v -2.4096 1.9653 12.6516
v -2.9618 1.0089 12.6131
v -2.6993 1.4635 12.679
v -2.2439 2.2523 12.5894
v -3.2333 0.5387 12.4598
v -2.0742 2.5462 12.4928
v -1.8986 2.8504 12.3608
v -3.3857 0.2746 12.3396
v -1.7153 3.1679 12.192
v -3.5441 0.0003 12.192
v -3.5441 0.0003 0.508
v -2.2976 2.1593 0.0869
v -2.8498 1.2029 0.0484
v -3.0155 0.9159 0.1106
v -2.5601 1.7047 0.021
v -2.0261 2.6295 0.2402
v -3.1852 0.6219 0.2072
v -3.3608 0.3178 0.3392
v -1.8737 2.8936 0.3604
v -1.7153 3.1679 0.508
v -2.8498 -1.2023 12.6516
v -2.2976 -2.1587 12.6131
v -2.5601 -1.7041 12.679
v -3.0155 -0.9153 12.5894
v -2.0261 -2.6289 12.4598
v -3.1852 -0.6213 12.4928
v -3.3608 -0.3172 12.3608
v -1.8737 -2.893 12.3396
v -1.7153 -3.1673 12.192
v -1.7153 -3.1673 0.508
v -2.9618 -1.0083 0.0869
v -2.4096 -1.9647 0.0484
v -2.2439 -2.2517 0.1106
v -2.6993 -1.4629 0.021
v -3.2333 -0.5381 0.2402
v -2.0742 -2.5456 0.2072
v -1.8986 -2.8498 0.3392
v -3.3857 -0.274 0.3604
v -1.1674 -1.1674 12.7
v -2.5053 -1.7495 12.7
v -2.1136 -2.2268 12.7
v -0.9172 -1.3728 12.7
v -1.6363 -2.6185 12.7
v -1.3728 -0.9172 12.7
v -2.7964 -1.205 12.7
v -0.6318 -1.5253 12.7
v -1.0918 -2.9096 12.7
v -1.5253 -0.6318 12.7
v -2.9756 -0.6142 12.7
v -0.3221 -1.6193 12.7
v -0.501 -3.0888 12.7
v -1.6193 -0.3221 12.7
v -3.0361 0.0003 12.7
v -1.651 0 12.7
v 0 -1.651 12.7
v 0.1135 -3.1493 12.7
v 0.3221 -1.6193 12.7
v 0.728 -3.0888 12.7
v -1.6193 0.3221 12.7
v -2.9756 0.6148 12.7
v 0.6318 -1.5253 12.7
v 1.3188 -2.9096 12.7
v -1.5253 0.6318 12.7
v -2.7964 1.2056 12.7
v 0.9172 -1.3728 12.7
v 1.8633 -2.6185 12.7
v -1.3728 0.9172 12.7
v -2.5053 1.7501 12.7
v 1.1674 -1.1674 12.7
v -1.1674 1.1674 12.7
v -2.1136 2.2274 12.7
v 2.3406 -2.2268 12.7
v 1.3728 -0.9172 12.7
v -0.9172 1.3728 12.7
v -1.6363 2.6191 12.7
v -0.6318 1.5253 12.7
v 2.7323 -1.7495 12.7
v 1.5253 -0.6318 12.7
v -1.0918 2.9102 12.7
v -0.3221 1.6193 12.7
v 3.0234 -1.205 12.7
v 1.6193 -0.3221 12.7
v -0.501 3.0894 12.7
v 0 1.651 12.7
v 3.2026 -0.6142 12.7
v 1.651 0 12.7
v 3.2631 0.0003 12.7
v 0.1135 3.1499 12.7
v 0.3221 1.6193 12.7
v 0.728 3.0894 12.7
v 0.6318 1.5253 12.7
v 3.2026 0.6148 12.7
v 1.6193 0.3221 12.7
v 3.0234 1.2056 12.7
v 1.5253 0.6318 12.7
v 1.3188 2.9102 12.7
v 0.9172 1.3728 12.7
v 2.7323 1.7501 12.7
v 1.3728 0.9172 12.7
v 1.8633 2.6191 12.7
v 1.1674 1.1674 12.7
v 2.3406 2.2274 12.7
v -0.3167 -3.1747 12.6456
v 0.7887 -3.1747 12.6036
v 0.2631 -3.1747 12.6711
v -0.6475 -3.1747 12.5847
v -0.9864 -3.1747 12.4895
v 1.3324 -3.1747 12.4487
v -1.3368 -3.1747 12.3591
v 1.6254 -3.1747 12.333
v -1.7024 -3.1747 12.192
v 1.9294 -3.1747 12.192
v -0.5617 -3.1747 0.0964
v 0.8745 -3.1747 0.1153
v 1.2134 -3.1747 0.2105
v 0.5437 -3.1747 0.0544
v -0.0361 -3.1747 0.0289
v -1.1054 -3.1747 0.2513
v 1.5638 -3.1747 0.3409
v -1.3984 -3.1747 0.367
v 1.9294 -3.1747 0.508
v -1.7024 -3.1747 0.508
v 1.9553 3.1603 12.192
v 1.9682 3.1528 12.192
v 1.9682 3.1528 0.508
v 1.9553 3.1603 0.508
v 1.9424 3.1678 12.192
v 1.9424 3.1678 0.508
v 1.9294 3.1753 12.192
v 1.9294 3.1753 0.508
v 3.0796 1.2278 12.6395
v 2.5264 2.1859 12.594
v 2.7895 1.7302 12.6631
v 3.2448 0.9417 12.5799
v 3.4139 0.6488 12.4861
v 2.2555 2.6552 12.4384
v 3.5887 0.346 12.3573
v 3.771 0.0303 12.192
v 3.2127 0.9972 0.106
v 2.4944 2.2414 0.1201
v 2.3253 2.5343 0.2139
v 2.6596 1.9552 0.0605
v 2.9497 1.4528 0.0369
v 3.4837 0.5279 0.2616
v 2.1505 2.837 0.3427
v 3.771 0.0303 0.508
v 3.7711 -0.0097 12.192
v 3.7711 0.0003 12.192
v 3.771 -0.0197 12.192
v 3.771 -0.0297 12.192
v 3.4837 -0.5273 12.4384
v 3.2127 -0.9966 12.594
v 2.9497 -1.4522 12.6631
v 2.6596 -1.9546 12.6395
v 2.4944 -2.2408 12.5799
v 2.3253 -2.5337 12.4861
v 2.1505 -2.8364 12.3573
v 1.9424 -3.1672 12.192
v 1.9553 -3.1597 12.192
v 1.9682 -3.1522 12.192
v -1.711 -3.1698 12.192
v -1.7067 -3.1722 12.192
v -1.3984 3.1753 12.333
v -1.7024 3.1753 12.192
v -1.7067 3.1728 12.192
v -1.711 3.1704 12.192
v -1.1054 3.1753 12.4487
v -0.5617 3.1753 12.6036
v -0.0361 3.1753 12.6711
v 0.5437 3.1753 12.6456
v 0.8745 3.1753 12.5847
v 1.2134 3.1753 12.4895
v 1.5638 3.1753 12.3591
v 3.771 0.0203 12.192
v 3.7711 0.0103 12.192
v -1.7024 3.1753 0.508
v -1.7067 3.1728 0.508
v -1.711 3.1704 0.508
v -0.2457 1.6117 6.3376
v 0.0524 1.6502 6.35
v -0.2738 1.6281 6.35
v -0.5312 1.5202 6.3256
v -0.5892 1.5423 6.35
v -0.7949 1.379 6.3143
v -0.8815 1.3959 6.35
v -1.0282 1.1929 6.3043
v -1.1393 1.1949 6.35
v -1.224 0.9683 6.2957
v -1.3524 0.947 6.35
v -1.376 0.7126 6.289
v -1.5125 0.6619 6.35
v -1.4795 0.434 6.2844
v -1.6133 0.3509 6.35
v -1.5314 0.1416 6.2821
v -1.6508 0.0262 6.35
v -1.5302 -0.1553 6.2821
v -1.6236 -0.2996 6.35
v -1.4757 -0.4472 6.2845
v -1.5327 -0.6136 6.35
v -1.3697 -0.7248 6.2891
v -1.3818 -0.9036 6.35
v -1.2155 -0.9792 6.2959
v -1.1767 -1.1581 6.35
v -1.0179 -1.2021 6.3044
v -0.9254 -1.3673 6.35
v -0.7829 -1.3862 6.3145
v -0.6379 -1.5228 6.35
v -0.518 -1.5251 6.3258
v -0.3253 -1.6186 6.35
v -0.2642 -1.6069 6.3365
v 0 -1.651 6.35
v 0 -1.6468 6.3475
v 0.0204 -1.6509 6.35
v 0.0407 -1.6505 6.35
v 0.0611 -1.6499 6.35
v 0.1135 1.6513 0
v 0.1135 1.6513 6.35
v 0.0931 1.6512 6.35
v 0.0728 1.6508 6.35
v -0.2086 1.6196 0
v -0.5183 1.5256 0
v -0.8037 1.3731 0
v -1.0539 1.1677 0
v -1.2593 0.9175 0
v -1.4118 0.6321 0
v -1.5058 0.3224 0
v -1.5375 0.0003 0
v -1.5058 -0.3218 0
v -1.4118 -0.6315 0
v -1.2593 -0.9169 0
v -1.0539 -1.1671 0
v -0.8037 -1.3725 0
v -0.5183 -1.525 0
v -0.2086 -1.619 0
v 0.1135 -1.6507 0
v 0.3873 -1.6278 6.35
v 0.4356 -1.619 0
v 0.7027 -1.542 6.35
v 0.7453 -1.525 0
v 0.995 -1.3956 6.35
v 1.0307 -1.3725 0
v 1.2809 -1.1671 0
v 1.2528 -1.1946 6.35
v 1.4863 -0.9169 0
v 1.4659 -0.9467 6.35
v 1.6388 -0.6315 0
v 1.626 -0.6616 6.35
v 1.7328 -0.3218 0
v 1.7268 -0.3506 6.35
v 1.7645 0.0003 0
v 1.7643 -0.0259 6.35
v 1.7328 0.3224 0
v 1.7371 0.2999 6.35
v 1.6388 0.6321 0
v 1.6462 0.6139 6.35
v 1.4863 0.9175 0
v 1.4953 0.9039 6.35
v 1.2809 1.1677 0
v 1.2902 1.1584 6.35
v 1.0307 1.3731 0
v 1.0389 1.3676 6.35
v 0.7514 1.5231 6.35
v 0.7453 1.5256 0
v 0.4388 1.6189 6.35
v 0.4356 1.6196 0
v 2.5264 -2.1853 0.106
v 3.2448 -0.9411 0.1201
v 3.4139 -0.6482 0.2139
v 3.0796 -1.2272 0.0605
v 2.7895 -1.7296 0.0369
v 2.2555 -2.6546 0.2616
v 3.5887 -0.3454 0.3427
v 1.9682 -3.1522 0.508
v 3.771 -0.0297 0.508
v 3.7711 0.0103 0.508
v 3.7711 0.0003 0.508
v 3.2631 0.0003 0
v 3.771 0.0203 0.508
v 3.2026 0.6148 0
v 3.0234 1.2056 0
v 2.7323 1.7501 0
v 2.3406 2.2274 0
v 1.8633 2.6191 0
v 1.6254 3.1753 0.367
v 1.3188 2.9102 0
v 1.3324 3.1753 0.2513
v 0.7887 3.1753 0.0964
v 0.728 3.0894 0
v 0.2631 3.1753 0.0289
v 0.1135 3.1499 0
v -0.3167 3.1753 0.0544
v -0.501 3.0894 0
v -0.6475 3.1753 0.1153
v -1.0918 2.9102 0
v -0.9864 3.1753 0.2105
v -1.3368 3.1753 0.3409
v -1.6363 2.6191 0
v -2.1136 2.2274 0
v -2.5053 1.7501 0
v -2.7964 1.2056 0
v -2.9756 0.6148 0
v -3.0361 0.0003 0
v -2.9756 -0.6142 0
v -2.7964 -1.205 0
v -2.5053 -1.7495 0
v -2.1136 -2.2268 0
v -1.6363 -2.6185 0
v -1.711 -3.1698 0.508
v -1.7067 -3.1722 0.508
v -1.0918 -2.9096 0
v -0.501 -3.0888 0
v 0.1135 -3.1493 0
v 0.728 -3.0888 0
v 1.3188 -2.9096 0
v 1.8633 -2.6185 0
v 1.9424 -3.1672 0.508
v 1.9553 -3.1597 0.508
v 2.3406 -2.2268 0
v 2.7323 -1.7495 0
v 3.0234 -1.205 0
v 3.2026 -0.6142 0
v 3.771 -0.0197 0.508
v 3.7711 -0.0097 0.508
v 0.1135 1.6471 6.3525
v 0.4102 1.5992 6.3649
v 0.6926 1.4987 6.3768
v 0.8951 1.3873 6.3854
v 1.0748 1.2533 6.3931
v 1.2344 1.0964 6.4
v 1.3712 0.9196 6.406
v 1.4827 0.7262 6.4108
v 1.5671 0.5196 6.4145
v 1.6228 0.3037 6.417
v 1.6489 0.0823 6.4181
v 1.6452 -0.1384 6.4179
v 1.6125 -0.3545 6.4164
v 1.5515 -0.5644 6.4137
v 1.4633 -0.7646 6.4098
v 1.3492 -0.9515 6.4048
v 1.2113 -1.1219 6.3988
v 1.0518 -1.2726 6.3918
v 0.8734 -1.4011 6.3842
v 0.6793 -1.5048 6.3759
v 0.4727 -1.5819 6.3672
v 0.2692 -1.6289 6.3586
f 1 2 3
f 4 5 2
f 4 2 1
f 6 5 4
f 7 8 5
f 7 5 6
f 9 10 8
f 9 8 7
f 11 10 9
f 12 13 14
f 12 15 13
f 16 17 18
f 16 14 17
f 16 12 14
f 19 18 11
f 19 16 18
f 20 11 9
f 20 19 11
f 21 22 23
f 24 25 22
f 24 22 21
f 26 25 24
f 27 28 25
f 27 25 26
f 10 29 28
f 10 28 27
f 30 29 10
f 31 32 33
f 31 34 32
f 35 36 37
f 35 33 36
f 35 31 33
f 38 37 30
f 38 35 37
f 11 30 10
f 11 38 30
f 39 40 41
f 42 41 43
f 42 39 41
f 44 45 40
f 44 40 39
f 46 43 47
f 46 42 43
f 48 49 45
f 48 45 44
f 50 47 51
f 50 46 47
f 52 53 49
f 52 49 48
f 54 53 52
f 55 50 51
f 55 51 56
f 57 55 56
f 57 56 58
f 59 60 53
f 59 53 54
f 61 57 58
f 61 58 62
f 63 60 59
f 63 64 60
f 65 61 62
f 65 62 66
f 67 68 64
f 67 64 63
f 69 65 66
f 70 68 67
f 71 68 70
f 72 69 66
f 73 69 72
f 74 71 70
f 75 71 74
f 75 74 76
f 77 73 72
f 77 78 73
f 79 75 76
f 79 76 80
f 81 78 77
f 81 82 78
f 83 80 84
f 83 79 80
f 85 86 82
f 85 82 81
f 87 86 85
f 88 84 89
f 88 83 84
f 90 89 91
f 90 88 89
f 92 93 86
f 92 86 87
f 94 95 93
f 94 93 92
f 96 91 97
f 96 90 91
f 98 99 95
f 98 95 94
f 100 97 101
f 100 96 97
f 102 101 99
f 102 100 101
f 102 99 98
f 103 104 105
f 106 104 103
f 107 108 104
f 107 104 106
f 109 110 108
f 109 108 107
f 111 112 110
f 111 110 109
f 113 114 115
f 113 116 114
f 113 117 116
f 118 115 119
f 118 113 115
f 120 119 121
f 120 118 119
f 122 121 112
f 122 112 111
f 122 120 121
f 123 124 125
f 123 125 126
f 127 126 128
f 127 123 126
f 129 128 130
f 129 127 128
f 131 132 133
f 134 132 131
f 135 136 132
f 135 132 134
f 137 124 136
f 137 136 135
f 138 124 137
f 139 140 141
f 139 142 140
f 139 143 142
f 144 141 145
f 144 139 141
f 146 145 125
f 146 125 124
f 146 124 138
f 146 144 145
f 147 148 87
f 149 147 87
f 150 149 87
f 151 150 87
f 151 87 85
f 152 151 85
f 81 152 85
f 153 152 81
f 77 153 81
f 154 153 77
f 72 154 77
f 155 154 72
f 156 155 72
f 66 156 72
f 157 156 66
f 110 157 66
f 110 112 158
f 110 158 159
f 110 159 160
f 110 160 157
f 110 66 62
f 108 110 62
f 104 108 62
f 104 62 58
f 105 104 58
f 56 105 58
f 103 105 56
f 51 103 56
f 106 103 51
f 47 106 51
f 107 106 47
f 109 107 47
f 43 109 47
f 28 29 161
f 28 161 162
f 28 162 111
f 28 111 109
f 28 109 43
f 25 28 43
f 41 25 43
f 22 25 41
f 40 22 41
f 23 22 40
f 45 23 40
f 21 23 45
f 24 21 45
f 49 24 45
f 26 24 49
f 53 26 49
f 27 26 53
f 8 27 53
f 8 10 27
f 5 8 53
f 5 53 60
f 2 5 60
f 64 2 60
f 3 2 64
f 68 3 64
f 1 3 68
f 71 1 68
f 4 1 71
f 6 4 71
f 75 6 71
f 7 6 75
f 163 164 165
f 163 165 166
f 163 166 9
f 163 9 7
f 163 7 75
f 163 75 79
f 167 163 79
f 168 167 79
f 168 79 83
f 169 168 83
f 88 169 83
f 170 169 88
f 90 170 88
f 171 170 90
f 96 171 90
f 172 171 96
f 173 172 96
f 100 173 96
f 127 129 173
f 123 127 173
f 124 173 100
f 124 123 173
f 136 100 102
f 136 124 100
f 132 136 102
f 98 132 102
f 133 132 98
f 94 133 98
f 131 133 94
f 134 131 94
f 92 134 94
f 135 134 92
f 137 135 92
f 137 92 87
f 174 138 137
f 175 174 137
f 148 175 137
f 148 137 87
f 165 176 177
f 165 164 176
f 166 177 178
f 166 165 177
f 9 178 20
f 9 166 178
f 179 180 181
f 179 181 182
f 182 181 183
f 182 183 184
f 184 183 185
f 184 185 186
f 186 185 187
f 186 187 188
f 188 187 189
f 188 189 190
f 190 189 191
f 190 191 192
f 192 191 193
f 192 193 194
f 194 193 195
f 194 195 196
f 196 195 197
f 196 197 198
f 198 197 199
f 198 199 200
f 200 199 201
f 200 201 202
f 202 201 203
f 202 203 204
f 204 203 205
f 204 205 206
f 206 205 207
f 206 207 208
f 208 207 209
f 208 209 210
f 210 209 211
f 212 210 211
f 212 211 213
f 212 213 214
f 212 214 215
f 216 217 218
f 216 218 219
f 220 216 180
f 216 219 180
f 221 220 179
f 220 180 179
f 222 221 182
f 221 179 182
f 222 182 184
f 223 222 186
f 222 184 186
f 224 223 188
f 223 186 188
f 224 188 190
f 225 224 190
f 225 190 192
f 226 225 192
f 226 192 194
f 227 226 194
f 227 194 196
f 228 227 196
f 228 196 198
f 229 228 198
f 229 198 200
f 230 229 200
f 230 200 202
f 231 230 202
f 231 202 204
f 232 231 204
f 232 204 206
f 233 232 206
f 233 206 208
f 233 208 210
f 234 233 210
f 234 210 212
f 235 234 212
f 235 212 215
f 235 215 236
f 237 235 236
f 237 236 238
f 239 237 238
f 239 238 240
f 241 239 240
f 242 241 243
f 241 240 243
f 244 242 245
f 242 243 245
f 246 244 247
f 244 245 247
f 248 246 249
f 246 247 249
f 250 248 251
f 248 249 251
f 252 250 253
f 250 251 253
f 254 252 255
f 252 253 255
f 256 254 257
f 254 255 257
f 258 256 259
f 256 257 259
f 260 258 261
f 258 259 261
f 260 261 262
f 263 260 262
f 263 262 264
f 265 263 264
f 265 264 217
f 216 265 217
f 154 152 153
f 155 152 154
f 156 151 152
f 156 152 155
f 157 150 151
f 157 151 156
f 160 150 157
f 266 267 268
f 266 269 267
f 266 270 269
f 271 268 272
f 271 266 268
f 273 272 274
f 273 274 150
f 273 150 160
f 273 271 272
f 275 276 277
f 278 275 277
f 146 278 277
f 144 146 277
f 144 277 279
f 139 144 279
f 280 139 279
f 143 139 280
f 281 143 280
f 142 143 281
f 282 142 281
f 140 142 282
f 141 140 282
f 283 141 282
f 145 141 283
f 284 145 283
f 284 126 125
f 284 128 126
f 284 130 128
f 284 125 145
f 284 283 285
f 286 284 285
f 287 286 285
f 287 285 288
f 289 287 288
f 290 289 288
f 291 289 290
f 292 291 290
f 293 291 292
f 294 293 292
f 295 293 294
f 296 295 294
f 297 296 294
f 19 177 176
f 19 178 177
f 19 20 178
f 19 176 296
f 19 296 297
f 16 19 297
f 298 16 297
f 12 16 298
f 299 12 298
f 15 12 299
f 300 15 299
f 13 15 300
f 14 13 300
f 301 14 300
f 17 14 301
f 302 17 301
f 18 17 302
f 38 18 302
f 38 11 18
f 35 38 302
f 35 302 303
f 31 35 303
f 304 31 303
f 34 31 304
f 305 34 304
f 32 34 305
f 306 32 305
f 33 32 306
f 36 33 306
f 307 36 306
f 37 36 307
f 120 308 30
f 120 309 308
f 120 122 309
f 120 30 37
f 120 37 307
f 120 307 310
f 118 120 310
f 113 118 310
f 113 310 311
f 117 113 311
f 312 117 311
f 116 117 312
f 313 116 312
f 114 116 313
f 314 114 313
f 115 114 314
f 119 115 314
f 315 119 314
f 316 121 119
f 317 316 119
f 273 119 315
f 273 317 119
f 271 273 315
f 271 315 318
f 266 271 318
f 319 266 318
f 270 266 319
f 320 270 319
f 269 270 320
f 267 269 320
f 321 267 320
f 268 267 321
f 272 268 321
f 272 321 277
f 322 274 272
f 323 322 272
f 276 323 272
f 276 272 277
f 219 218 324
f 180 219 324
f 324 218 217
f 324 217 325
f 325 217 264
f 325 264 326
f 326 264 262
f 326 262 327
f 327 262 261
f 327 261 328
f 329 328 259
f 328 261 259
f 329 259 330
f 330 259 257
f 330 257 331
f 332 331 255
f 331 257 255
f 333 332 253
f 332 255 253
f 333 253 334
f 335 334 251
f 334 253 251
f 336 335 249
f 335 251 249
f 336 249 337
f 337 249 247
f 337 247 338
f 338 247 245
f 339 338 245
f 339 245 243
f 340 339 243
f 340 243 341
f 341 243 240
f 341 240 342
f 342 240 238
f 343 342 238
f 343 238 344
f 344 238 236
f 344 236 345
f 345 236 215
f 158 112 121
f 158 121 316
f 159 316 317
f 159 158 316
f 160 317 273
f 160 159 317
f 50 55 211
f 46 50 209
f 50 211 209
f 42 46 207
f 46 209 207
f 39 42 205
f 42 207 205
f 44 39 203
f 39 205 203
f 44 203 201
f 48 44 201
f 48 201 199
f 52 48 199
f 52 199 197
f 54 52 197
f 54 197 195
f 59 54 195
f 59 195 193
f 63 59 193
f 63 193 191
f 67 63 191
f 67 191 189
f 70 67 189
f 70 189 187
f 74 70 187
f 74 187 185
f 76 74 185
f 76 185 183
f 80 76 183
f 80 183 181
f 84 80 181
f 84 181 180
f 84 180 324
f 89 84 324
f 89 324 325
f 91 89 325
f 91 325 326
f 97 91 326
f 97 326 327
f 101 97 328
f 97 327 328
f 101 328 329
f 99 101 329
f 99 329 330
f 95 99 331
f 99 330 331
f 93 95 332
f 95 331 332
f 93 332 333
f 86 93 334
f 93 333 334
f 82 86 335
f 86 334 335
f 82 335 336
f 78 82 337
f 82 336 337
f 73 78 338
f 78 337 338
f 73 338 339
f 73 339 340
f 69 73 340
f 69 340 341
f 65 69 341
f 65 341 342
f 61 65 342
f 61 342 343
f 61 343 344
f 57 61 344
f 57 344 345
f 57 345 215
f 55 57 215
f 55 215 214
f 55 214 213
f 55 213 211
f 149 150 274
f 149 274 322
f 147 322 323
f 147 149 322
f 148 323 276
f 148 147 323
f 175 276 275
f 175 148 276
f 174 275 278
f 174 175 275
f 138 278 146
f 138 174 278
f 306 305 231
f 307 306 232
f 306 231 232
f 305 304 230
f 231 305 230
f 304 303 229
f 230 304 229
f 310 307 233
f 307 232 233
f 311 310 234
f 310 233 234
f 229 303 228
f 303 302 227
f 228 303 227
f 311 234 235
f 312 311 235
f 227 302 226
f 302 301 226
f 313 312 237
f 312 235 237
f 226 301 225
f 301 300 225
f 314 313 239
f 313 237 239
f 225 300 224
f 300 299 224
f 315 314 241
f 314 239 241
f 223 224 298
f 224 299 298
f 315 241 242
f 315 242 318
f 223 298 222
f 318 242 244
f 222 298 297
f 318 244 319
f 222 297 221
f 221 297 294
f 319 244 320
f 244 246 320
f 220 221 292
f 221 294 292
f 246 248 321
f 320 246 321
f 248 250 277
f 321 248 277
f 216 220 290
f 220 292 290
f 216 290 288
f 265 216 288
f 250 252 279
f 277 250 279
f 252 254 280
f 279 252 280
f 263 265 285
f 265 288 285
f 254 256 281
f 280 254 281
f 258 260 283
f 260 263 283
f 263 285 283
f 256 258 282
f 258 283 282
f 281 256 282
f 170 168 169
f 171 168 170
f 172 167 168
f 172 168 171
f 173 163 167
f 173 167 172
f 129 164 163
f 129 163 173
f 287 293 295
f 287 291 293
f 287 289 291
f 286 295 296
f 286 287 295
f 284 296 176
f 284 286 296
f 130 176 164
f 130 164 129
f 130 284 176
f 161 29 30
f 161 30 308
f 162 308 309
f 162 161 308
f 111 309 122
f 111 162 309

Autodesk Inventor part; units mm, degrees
ref_plane "YZ Plane" through (0, 0, 0) normal (1, 0, 0) x (0, 1, 0)
sketch "Sketch1" plane through (0, 0, 0) normal (0, 0, 1) x (1, 0, 0)
  line L0 (1.9552, -3.1747) -> (-1.711, -3.1747)
  line L1 (-1.711, -3.1747) -> (-3.5441, 0.0003)
  line L2 (-3.5441, 0.0003) -> (-1.711, 3.1753)
  line L3 (-1.711, 3.1753) -> (1.9552, 3.1753)
  line L4 (1.9552, 3.1753) -> (3.7883, 0.0003)
  line L5 (3.7883, 0.0003) -> (1.9552, -3.1747)
  point P0 (0.1221, 0.0003)
  dimension "d0" = 6.35
extrude "Extrusion1" add sketch "Sketch1" along normal blind 12.7
ref_plane "Work Plane1" through (-1.711, 0.0003, 0) normal (0, 1, 0) x (1, 0, 0)
sketch "Sketch3" plane through (-1.711, 0.0003, 0) normal (0, 1, 0) x (1, 0, 0)
  line L0 (-1.3251, 0) -> (4.9741, 0)
  line L1 (5.4821, -0.508) -> (5.4821, -12.192)
  line L2 (-1.8331, -12.192) -> (-1.8331, -0.508)
  line L3 (-1.8331, -0.508) -> (-1.3251, 0)
  line L4 (4.9741, 0) -> (5.4821, -0.508)
  line L5 (-1.8331, 0) -> (-1.8331, -12.7) projected
  line L6 (3.6662, 0) -> (5.4993, 0) projected
  line L7 (1.8245, 0) -> (1.8245, -12.7)
  line L8 (0, -12.7) -> (-1.8331, -12.7) projected
  line L9 (5.4993, -12.7) -> (3.6662, -12.7) projected
  line L10 (3.6662, -12.7) -> (0, -12.7) projected
  line L11 (-1.3251, -12.7) -> (-1.8331, -12.192)
  line L12 (4.9741, -12.7) -> (5.4821, -12.192)
  point P0 (-1.8331, 0)
  point P1 (5.4821, 0)
  point P2 (5.4821, -12.7)
  dimension "d5" = 0.508
  dimension "d6" = 0.508
  dimension "d7" = 0.508
  dimension "d8" = 0.508
  dimension "d16" = 0
  dimension "d46" = 0.508
  dimension "d47" = 0.508
  dimension "d48" = 0.508
  dimension "d49" = 0.508
revolve "Revolution1" cut sketch "Sketch3" angle 360 about axis through (0.1135, 0.0003, 0) along (0, 0, 1) keep common part contours L0 L4 L1 L12 L9 L10 L7
sketch "Sketch6" plane through (0.1135, 0.0003, 0) normal (0, 0, -1) x (-1, 0, 0)
  circle A0 centre (0, 0) radius 3.1496 projected
hole "Hole3" at (0.1135, 0.0003, 0) direction (0, 0, 1) diameter 3.302 depth 6.35 tip angle 118 thread size "8-32 UNC" class "2B" standard "ANSI Unified Screw Threads"
sketch "Sketch7" plane through (0, 0, 12.7) normal (0, 0, 1) x (1, 0, 0)
  point P0 (0, 0)
hole "Hole4" at (0, 0, 12.7) direction (0, 0, -1) diameter 3.302 depth 6.35 tip angle 118 thread size "8-32 UNC" class "2B" standard "ANSI Unified Screw Threads"
ref_plane "Work Plane2" through (0.1135, 0.0003, 6.35) normal (0, 0, -1) x (-1, 0, 0)
equation "\"d6\" = d5"
equation "\"d7\" = d5"
equation "\"d8\" = d7"
properties part number "0.5 inch Standoff" material "Steel"
